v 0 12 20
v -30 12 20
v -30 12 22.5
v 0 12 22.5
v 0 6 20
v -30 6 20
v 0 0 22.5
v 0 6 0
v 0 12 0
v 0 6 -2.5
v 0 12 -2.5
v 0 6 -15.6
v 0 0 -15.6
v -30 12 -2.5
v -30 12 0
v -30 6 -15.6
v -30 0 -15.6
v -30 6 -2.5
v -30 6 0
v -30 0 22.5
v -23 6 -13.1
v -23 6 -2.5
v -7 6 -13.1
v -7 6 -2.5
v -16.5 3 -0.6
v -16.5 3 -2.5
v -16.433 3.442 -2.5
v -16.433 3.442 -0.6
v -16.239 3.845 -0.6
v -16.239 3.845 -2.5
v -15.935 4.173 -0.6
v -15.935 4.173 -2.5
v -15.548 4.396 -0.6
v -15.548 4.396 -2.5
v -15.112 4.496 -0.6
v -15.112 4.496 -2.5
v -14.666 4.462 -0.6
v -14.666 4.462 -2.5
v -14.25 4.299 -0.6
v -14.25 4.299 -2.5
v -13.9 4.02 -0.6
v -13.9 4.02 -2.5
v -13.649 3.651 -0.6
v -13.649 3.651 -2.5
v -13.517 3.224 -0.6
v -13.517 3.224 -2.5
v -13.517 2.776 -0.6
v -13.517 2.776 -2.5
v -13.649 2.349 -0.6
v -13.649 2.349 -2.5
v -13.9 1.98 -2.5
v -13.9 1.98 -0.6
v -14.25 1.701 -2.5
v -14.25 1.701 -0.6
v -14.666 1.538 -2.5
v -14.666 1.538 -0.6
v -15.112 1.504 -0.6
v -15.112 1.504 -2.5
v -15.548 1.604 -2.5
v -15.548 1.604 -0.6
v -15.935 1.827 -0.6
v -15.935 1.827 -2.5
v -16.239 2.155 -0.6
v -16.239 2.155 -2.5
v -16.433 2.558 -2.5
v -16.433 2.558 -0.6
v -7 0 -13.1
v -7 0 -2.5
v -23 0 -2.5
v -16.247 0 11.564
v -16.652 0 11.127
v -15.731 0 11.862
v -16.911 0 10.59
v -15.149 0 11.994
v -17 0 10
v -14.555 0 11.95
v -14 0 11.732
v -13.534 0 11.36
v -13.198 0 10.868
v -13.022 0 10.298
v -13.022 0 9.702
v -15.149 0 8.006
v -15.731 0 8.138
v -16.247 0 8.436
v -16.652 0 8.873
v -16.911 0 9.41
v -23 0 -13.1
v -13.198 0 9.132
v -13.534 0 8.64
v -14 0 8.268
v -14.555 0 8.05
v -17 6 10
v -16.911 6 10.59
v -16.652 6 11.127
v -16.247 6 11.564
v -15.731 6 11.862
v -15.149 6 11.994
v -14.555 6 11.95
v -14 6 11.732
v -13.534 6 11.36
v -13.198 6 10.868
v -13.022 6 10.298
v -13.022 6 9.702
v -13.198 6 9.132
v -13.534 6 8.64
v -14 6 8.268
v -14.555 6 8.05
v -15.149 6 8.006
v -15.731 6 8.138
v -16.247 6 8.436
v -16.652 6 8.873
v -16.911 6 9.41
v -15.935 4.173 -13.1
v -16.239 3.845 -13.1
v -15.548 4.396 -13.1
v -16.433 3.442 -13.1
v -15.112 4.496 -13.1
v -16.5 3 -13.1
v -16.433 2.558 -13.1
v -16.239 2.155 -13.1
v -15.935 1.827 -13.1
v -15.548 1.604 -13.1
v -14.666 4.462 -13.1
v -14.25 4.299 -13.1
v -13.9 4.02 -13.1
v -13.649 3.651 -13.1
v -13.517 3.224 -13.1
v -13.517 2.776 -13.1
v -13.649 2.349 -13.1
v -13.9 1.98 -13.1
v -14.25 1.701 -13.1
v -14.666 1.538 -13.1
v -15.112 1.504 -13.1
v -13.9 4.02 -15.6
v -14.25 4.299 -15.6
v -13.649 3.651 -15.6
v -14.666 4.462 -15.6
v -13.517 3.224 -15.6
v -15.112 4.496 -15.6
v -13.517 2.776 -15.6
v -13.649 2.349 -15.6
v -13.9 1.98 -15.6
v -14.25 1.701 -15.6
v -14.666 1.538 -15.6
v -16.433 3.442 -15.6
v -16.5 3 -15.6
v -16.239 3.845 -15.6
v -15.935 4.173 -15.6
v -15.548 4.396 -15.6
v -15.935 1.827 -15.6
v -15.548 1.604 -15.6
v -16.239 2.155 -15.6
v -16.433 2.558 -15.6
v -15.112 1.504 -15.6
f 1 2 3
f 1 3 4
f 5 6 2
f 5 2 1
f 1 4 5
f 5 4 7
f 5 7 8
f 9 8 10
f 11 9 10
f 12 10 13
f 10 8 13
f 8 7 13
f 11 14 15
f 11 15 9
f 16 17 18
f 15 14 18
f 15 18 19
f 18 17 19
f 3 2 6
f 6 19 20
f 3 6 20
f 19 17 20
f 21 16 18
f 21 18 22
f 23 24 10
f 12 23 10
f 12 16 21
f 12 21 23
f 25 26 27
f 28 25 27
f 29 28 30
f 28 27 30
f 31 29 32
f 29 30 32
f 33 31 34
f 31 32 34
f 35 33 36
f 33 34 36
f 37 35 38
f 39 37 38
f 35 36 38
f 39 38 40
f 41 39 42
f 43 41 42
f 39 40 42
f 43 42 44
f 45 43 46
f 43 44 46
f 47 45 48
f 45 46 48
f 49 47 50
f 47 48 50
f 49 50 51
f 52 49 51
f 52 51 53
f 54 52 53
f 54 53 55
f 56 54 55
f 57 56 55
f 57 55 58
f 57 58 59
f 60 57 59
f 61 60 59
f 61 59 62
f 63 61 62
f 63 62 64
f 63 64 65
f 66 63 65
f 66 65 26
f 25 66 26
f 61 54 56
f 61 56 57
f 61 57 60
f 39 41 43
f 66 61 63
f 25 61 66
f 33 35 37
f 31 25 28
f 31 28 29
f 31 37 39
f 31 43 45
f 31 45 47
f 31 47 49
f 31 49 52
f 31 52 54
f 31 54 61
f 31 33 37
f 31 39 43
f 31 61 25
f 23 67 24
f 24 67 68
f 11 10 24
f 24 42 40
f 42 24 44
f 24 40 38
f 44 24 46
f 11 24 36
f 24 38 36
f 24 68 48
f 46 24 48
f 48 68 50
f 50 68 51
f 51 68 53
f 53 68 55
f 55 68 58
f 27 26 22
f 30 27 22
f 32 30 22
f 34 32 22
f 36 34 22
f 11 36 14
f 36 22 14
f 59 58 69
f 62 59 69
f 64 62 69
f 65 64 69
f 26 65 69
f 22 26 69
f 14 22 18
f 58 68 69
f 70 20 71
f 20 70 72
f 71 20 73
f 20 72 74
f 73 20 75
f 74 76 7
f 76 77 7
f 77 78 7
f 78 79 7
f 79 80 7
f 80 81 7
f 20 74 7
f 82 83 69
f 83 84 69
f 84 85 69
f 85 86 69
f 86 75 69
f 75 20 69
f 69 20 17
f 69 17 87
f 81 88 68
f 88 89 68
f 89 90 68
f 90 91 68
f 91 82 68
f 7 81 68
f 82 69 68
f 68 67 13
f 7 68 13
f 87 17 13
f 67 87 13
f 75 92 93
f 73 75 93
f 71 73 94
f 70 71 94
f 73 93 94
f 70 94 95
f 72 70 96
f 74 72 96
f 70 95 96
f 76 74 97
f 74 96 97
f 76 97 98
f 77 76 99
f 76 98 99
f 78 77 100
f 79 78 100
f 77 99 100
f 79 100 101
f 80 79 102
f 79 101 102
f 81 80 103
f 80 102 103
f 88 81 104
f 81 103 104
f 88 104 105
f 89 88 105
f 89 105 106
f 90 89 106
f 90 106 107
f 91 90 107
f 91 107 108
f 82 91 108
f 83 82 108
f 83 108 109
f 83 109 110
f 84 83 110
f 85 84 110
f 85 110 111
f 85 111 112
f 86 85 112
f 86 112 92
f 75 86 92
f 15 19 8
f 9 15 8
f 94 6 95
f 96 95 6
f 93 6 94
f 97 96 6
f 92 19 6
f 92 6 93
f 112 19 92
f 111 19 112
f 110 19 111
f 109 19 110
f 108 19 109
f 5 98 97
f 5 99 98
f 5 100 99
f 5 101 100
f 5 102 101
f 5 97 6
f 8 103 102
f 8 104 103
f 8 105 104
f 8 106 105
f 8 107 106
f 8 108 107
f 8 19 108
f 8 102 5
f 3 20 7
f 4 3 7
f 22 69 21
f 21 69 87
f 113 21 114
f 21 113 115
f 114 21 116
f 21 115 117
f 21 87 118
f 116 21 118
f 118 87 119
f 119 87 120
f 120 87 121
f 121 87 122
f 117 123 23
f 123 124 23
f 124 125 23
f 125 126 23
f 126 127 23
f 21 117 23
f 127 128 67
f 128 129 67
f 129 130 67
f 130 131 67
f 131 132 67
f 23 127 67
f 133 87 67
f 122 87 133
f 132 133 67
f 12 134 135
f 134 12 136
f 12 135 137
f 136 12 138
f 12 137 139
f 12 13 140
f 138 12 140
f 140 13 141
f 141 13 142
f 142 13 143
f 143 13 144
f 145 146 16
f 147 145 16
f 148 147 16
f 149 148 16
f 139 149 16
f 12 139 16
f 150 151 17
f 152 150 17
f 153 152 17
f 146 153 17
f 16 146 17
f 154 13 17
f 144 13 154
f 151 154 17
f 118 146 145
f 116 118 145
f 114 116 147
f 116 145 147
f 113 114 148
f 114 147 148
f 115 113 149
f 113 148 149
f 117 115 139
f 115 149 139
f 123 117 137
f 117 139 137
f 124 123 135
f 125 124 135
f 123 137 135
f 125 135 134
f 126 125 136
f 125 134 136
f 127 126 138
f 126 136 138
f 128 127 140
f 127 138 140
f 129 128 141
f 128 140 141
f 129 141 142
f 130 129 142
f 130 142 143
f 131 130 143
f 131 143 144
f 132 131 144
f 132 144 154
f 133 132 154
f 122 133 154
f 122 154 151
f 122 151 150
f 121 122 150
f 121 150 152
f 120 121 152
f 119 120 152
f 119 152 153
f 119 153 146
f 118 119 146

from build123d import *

# Parameters (mm, degrees)
SKETCH1_W           = 30
SKETCH1_H           = 38.1
SKETCH1_W_2         = 16
SKETCH1_H_2         = 10.6
BOSS_EXTRUDE1_DEPTH = 6
SKETCH1_3_W         = 30
SKETCH1_3_H         = 2.5
BOSS_EXTRUDE2_DEPTH = 12
SKETCH3_R           = 1.5
CUT_EXTRUDE2_DEPTH  = 15
SKETCH2_R           = 2
CUT_EXTRUDE1_DEPTH  = 38.976966704


with BuildPart() as part:
    # Sketch1 → Boss-Extrude1 (new body)
    with BuildSketch(Plane(origin=(0, 0, 0), x_dir=(1, 0, 0), z_dir=(0, 1, 0))):
        with Locations((-15, -3.45)):
            Rectangle(SKETCH1_W, SKETCH1_H)
        with Locations((-15, 7.8)):
            Rectangle(SKETCH1_W_2, SKETCH1_H_2, mode=Mode.SUBTRACT)
    extrude(amount=BOSS_EXTRUDE1_DEPTH)

    # Sketch1<3> → Boss-Extrude2 (add)
    with BuildSketch(Plane(origin=(0, 0, 0), x_dir=(1, 0, 0), z_dir=(0, 1, 0))):
        with Locations((-15, -21.25)):
            Rectangle(SKETCH1_3_W, SKETCH1_3_H)
        with Locations((-15, 1.25)):
            Rectangle(SKETCH1_3_W, SKETCH1_3_H)
    extrude(amount=BOSS_EXTRUDE2_DEPTH)

    # Sketch3 → Cut-Extrude2 (cut)
    with BuildSketch(Plane(origin=(0, 0, -15.6), x_dir=(-1, 0, 0), z_dir=(0, 0, -1))):
        with Locations((15, 3)):
            Circle(SKETCH3_R)
    extrude(amount=-CUT_EXTRUDE2_DEPTH, mode=Mode.SUBTRACT)

    # Sketch2 → Cut-Extrude1 (cut, through all)
    with BuildSketch(Plane(origin=(0, 6, 0), x_dir=(1, 0, 0), z_dir=(0, 1, 0))):
        with Locations((-15, -10)):
            Circle(SKETCH2_R)
    extrude(amount=-CUT_EXTRUDE1_DEPTH, mode=Mode.SUBTRACT)


solid = part.part
